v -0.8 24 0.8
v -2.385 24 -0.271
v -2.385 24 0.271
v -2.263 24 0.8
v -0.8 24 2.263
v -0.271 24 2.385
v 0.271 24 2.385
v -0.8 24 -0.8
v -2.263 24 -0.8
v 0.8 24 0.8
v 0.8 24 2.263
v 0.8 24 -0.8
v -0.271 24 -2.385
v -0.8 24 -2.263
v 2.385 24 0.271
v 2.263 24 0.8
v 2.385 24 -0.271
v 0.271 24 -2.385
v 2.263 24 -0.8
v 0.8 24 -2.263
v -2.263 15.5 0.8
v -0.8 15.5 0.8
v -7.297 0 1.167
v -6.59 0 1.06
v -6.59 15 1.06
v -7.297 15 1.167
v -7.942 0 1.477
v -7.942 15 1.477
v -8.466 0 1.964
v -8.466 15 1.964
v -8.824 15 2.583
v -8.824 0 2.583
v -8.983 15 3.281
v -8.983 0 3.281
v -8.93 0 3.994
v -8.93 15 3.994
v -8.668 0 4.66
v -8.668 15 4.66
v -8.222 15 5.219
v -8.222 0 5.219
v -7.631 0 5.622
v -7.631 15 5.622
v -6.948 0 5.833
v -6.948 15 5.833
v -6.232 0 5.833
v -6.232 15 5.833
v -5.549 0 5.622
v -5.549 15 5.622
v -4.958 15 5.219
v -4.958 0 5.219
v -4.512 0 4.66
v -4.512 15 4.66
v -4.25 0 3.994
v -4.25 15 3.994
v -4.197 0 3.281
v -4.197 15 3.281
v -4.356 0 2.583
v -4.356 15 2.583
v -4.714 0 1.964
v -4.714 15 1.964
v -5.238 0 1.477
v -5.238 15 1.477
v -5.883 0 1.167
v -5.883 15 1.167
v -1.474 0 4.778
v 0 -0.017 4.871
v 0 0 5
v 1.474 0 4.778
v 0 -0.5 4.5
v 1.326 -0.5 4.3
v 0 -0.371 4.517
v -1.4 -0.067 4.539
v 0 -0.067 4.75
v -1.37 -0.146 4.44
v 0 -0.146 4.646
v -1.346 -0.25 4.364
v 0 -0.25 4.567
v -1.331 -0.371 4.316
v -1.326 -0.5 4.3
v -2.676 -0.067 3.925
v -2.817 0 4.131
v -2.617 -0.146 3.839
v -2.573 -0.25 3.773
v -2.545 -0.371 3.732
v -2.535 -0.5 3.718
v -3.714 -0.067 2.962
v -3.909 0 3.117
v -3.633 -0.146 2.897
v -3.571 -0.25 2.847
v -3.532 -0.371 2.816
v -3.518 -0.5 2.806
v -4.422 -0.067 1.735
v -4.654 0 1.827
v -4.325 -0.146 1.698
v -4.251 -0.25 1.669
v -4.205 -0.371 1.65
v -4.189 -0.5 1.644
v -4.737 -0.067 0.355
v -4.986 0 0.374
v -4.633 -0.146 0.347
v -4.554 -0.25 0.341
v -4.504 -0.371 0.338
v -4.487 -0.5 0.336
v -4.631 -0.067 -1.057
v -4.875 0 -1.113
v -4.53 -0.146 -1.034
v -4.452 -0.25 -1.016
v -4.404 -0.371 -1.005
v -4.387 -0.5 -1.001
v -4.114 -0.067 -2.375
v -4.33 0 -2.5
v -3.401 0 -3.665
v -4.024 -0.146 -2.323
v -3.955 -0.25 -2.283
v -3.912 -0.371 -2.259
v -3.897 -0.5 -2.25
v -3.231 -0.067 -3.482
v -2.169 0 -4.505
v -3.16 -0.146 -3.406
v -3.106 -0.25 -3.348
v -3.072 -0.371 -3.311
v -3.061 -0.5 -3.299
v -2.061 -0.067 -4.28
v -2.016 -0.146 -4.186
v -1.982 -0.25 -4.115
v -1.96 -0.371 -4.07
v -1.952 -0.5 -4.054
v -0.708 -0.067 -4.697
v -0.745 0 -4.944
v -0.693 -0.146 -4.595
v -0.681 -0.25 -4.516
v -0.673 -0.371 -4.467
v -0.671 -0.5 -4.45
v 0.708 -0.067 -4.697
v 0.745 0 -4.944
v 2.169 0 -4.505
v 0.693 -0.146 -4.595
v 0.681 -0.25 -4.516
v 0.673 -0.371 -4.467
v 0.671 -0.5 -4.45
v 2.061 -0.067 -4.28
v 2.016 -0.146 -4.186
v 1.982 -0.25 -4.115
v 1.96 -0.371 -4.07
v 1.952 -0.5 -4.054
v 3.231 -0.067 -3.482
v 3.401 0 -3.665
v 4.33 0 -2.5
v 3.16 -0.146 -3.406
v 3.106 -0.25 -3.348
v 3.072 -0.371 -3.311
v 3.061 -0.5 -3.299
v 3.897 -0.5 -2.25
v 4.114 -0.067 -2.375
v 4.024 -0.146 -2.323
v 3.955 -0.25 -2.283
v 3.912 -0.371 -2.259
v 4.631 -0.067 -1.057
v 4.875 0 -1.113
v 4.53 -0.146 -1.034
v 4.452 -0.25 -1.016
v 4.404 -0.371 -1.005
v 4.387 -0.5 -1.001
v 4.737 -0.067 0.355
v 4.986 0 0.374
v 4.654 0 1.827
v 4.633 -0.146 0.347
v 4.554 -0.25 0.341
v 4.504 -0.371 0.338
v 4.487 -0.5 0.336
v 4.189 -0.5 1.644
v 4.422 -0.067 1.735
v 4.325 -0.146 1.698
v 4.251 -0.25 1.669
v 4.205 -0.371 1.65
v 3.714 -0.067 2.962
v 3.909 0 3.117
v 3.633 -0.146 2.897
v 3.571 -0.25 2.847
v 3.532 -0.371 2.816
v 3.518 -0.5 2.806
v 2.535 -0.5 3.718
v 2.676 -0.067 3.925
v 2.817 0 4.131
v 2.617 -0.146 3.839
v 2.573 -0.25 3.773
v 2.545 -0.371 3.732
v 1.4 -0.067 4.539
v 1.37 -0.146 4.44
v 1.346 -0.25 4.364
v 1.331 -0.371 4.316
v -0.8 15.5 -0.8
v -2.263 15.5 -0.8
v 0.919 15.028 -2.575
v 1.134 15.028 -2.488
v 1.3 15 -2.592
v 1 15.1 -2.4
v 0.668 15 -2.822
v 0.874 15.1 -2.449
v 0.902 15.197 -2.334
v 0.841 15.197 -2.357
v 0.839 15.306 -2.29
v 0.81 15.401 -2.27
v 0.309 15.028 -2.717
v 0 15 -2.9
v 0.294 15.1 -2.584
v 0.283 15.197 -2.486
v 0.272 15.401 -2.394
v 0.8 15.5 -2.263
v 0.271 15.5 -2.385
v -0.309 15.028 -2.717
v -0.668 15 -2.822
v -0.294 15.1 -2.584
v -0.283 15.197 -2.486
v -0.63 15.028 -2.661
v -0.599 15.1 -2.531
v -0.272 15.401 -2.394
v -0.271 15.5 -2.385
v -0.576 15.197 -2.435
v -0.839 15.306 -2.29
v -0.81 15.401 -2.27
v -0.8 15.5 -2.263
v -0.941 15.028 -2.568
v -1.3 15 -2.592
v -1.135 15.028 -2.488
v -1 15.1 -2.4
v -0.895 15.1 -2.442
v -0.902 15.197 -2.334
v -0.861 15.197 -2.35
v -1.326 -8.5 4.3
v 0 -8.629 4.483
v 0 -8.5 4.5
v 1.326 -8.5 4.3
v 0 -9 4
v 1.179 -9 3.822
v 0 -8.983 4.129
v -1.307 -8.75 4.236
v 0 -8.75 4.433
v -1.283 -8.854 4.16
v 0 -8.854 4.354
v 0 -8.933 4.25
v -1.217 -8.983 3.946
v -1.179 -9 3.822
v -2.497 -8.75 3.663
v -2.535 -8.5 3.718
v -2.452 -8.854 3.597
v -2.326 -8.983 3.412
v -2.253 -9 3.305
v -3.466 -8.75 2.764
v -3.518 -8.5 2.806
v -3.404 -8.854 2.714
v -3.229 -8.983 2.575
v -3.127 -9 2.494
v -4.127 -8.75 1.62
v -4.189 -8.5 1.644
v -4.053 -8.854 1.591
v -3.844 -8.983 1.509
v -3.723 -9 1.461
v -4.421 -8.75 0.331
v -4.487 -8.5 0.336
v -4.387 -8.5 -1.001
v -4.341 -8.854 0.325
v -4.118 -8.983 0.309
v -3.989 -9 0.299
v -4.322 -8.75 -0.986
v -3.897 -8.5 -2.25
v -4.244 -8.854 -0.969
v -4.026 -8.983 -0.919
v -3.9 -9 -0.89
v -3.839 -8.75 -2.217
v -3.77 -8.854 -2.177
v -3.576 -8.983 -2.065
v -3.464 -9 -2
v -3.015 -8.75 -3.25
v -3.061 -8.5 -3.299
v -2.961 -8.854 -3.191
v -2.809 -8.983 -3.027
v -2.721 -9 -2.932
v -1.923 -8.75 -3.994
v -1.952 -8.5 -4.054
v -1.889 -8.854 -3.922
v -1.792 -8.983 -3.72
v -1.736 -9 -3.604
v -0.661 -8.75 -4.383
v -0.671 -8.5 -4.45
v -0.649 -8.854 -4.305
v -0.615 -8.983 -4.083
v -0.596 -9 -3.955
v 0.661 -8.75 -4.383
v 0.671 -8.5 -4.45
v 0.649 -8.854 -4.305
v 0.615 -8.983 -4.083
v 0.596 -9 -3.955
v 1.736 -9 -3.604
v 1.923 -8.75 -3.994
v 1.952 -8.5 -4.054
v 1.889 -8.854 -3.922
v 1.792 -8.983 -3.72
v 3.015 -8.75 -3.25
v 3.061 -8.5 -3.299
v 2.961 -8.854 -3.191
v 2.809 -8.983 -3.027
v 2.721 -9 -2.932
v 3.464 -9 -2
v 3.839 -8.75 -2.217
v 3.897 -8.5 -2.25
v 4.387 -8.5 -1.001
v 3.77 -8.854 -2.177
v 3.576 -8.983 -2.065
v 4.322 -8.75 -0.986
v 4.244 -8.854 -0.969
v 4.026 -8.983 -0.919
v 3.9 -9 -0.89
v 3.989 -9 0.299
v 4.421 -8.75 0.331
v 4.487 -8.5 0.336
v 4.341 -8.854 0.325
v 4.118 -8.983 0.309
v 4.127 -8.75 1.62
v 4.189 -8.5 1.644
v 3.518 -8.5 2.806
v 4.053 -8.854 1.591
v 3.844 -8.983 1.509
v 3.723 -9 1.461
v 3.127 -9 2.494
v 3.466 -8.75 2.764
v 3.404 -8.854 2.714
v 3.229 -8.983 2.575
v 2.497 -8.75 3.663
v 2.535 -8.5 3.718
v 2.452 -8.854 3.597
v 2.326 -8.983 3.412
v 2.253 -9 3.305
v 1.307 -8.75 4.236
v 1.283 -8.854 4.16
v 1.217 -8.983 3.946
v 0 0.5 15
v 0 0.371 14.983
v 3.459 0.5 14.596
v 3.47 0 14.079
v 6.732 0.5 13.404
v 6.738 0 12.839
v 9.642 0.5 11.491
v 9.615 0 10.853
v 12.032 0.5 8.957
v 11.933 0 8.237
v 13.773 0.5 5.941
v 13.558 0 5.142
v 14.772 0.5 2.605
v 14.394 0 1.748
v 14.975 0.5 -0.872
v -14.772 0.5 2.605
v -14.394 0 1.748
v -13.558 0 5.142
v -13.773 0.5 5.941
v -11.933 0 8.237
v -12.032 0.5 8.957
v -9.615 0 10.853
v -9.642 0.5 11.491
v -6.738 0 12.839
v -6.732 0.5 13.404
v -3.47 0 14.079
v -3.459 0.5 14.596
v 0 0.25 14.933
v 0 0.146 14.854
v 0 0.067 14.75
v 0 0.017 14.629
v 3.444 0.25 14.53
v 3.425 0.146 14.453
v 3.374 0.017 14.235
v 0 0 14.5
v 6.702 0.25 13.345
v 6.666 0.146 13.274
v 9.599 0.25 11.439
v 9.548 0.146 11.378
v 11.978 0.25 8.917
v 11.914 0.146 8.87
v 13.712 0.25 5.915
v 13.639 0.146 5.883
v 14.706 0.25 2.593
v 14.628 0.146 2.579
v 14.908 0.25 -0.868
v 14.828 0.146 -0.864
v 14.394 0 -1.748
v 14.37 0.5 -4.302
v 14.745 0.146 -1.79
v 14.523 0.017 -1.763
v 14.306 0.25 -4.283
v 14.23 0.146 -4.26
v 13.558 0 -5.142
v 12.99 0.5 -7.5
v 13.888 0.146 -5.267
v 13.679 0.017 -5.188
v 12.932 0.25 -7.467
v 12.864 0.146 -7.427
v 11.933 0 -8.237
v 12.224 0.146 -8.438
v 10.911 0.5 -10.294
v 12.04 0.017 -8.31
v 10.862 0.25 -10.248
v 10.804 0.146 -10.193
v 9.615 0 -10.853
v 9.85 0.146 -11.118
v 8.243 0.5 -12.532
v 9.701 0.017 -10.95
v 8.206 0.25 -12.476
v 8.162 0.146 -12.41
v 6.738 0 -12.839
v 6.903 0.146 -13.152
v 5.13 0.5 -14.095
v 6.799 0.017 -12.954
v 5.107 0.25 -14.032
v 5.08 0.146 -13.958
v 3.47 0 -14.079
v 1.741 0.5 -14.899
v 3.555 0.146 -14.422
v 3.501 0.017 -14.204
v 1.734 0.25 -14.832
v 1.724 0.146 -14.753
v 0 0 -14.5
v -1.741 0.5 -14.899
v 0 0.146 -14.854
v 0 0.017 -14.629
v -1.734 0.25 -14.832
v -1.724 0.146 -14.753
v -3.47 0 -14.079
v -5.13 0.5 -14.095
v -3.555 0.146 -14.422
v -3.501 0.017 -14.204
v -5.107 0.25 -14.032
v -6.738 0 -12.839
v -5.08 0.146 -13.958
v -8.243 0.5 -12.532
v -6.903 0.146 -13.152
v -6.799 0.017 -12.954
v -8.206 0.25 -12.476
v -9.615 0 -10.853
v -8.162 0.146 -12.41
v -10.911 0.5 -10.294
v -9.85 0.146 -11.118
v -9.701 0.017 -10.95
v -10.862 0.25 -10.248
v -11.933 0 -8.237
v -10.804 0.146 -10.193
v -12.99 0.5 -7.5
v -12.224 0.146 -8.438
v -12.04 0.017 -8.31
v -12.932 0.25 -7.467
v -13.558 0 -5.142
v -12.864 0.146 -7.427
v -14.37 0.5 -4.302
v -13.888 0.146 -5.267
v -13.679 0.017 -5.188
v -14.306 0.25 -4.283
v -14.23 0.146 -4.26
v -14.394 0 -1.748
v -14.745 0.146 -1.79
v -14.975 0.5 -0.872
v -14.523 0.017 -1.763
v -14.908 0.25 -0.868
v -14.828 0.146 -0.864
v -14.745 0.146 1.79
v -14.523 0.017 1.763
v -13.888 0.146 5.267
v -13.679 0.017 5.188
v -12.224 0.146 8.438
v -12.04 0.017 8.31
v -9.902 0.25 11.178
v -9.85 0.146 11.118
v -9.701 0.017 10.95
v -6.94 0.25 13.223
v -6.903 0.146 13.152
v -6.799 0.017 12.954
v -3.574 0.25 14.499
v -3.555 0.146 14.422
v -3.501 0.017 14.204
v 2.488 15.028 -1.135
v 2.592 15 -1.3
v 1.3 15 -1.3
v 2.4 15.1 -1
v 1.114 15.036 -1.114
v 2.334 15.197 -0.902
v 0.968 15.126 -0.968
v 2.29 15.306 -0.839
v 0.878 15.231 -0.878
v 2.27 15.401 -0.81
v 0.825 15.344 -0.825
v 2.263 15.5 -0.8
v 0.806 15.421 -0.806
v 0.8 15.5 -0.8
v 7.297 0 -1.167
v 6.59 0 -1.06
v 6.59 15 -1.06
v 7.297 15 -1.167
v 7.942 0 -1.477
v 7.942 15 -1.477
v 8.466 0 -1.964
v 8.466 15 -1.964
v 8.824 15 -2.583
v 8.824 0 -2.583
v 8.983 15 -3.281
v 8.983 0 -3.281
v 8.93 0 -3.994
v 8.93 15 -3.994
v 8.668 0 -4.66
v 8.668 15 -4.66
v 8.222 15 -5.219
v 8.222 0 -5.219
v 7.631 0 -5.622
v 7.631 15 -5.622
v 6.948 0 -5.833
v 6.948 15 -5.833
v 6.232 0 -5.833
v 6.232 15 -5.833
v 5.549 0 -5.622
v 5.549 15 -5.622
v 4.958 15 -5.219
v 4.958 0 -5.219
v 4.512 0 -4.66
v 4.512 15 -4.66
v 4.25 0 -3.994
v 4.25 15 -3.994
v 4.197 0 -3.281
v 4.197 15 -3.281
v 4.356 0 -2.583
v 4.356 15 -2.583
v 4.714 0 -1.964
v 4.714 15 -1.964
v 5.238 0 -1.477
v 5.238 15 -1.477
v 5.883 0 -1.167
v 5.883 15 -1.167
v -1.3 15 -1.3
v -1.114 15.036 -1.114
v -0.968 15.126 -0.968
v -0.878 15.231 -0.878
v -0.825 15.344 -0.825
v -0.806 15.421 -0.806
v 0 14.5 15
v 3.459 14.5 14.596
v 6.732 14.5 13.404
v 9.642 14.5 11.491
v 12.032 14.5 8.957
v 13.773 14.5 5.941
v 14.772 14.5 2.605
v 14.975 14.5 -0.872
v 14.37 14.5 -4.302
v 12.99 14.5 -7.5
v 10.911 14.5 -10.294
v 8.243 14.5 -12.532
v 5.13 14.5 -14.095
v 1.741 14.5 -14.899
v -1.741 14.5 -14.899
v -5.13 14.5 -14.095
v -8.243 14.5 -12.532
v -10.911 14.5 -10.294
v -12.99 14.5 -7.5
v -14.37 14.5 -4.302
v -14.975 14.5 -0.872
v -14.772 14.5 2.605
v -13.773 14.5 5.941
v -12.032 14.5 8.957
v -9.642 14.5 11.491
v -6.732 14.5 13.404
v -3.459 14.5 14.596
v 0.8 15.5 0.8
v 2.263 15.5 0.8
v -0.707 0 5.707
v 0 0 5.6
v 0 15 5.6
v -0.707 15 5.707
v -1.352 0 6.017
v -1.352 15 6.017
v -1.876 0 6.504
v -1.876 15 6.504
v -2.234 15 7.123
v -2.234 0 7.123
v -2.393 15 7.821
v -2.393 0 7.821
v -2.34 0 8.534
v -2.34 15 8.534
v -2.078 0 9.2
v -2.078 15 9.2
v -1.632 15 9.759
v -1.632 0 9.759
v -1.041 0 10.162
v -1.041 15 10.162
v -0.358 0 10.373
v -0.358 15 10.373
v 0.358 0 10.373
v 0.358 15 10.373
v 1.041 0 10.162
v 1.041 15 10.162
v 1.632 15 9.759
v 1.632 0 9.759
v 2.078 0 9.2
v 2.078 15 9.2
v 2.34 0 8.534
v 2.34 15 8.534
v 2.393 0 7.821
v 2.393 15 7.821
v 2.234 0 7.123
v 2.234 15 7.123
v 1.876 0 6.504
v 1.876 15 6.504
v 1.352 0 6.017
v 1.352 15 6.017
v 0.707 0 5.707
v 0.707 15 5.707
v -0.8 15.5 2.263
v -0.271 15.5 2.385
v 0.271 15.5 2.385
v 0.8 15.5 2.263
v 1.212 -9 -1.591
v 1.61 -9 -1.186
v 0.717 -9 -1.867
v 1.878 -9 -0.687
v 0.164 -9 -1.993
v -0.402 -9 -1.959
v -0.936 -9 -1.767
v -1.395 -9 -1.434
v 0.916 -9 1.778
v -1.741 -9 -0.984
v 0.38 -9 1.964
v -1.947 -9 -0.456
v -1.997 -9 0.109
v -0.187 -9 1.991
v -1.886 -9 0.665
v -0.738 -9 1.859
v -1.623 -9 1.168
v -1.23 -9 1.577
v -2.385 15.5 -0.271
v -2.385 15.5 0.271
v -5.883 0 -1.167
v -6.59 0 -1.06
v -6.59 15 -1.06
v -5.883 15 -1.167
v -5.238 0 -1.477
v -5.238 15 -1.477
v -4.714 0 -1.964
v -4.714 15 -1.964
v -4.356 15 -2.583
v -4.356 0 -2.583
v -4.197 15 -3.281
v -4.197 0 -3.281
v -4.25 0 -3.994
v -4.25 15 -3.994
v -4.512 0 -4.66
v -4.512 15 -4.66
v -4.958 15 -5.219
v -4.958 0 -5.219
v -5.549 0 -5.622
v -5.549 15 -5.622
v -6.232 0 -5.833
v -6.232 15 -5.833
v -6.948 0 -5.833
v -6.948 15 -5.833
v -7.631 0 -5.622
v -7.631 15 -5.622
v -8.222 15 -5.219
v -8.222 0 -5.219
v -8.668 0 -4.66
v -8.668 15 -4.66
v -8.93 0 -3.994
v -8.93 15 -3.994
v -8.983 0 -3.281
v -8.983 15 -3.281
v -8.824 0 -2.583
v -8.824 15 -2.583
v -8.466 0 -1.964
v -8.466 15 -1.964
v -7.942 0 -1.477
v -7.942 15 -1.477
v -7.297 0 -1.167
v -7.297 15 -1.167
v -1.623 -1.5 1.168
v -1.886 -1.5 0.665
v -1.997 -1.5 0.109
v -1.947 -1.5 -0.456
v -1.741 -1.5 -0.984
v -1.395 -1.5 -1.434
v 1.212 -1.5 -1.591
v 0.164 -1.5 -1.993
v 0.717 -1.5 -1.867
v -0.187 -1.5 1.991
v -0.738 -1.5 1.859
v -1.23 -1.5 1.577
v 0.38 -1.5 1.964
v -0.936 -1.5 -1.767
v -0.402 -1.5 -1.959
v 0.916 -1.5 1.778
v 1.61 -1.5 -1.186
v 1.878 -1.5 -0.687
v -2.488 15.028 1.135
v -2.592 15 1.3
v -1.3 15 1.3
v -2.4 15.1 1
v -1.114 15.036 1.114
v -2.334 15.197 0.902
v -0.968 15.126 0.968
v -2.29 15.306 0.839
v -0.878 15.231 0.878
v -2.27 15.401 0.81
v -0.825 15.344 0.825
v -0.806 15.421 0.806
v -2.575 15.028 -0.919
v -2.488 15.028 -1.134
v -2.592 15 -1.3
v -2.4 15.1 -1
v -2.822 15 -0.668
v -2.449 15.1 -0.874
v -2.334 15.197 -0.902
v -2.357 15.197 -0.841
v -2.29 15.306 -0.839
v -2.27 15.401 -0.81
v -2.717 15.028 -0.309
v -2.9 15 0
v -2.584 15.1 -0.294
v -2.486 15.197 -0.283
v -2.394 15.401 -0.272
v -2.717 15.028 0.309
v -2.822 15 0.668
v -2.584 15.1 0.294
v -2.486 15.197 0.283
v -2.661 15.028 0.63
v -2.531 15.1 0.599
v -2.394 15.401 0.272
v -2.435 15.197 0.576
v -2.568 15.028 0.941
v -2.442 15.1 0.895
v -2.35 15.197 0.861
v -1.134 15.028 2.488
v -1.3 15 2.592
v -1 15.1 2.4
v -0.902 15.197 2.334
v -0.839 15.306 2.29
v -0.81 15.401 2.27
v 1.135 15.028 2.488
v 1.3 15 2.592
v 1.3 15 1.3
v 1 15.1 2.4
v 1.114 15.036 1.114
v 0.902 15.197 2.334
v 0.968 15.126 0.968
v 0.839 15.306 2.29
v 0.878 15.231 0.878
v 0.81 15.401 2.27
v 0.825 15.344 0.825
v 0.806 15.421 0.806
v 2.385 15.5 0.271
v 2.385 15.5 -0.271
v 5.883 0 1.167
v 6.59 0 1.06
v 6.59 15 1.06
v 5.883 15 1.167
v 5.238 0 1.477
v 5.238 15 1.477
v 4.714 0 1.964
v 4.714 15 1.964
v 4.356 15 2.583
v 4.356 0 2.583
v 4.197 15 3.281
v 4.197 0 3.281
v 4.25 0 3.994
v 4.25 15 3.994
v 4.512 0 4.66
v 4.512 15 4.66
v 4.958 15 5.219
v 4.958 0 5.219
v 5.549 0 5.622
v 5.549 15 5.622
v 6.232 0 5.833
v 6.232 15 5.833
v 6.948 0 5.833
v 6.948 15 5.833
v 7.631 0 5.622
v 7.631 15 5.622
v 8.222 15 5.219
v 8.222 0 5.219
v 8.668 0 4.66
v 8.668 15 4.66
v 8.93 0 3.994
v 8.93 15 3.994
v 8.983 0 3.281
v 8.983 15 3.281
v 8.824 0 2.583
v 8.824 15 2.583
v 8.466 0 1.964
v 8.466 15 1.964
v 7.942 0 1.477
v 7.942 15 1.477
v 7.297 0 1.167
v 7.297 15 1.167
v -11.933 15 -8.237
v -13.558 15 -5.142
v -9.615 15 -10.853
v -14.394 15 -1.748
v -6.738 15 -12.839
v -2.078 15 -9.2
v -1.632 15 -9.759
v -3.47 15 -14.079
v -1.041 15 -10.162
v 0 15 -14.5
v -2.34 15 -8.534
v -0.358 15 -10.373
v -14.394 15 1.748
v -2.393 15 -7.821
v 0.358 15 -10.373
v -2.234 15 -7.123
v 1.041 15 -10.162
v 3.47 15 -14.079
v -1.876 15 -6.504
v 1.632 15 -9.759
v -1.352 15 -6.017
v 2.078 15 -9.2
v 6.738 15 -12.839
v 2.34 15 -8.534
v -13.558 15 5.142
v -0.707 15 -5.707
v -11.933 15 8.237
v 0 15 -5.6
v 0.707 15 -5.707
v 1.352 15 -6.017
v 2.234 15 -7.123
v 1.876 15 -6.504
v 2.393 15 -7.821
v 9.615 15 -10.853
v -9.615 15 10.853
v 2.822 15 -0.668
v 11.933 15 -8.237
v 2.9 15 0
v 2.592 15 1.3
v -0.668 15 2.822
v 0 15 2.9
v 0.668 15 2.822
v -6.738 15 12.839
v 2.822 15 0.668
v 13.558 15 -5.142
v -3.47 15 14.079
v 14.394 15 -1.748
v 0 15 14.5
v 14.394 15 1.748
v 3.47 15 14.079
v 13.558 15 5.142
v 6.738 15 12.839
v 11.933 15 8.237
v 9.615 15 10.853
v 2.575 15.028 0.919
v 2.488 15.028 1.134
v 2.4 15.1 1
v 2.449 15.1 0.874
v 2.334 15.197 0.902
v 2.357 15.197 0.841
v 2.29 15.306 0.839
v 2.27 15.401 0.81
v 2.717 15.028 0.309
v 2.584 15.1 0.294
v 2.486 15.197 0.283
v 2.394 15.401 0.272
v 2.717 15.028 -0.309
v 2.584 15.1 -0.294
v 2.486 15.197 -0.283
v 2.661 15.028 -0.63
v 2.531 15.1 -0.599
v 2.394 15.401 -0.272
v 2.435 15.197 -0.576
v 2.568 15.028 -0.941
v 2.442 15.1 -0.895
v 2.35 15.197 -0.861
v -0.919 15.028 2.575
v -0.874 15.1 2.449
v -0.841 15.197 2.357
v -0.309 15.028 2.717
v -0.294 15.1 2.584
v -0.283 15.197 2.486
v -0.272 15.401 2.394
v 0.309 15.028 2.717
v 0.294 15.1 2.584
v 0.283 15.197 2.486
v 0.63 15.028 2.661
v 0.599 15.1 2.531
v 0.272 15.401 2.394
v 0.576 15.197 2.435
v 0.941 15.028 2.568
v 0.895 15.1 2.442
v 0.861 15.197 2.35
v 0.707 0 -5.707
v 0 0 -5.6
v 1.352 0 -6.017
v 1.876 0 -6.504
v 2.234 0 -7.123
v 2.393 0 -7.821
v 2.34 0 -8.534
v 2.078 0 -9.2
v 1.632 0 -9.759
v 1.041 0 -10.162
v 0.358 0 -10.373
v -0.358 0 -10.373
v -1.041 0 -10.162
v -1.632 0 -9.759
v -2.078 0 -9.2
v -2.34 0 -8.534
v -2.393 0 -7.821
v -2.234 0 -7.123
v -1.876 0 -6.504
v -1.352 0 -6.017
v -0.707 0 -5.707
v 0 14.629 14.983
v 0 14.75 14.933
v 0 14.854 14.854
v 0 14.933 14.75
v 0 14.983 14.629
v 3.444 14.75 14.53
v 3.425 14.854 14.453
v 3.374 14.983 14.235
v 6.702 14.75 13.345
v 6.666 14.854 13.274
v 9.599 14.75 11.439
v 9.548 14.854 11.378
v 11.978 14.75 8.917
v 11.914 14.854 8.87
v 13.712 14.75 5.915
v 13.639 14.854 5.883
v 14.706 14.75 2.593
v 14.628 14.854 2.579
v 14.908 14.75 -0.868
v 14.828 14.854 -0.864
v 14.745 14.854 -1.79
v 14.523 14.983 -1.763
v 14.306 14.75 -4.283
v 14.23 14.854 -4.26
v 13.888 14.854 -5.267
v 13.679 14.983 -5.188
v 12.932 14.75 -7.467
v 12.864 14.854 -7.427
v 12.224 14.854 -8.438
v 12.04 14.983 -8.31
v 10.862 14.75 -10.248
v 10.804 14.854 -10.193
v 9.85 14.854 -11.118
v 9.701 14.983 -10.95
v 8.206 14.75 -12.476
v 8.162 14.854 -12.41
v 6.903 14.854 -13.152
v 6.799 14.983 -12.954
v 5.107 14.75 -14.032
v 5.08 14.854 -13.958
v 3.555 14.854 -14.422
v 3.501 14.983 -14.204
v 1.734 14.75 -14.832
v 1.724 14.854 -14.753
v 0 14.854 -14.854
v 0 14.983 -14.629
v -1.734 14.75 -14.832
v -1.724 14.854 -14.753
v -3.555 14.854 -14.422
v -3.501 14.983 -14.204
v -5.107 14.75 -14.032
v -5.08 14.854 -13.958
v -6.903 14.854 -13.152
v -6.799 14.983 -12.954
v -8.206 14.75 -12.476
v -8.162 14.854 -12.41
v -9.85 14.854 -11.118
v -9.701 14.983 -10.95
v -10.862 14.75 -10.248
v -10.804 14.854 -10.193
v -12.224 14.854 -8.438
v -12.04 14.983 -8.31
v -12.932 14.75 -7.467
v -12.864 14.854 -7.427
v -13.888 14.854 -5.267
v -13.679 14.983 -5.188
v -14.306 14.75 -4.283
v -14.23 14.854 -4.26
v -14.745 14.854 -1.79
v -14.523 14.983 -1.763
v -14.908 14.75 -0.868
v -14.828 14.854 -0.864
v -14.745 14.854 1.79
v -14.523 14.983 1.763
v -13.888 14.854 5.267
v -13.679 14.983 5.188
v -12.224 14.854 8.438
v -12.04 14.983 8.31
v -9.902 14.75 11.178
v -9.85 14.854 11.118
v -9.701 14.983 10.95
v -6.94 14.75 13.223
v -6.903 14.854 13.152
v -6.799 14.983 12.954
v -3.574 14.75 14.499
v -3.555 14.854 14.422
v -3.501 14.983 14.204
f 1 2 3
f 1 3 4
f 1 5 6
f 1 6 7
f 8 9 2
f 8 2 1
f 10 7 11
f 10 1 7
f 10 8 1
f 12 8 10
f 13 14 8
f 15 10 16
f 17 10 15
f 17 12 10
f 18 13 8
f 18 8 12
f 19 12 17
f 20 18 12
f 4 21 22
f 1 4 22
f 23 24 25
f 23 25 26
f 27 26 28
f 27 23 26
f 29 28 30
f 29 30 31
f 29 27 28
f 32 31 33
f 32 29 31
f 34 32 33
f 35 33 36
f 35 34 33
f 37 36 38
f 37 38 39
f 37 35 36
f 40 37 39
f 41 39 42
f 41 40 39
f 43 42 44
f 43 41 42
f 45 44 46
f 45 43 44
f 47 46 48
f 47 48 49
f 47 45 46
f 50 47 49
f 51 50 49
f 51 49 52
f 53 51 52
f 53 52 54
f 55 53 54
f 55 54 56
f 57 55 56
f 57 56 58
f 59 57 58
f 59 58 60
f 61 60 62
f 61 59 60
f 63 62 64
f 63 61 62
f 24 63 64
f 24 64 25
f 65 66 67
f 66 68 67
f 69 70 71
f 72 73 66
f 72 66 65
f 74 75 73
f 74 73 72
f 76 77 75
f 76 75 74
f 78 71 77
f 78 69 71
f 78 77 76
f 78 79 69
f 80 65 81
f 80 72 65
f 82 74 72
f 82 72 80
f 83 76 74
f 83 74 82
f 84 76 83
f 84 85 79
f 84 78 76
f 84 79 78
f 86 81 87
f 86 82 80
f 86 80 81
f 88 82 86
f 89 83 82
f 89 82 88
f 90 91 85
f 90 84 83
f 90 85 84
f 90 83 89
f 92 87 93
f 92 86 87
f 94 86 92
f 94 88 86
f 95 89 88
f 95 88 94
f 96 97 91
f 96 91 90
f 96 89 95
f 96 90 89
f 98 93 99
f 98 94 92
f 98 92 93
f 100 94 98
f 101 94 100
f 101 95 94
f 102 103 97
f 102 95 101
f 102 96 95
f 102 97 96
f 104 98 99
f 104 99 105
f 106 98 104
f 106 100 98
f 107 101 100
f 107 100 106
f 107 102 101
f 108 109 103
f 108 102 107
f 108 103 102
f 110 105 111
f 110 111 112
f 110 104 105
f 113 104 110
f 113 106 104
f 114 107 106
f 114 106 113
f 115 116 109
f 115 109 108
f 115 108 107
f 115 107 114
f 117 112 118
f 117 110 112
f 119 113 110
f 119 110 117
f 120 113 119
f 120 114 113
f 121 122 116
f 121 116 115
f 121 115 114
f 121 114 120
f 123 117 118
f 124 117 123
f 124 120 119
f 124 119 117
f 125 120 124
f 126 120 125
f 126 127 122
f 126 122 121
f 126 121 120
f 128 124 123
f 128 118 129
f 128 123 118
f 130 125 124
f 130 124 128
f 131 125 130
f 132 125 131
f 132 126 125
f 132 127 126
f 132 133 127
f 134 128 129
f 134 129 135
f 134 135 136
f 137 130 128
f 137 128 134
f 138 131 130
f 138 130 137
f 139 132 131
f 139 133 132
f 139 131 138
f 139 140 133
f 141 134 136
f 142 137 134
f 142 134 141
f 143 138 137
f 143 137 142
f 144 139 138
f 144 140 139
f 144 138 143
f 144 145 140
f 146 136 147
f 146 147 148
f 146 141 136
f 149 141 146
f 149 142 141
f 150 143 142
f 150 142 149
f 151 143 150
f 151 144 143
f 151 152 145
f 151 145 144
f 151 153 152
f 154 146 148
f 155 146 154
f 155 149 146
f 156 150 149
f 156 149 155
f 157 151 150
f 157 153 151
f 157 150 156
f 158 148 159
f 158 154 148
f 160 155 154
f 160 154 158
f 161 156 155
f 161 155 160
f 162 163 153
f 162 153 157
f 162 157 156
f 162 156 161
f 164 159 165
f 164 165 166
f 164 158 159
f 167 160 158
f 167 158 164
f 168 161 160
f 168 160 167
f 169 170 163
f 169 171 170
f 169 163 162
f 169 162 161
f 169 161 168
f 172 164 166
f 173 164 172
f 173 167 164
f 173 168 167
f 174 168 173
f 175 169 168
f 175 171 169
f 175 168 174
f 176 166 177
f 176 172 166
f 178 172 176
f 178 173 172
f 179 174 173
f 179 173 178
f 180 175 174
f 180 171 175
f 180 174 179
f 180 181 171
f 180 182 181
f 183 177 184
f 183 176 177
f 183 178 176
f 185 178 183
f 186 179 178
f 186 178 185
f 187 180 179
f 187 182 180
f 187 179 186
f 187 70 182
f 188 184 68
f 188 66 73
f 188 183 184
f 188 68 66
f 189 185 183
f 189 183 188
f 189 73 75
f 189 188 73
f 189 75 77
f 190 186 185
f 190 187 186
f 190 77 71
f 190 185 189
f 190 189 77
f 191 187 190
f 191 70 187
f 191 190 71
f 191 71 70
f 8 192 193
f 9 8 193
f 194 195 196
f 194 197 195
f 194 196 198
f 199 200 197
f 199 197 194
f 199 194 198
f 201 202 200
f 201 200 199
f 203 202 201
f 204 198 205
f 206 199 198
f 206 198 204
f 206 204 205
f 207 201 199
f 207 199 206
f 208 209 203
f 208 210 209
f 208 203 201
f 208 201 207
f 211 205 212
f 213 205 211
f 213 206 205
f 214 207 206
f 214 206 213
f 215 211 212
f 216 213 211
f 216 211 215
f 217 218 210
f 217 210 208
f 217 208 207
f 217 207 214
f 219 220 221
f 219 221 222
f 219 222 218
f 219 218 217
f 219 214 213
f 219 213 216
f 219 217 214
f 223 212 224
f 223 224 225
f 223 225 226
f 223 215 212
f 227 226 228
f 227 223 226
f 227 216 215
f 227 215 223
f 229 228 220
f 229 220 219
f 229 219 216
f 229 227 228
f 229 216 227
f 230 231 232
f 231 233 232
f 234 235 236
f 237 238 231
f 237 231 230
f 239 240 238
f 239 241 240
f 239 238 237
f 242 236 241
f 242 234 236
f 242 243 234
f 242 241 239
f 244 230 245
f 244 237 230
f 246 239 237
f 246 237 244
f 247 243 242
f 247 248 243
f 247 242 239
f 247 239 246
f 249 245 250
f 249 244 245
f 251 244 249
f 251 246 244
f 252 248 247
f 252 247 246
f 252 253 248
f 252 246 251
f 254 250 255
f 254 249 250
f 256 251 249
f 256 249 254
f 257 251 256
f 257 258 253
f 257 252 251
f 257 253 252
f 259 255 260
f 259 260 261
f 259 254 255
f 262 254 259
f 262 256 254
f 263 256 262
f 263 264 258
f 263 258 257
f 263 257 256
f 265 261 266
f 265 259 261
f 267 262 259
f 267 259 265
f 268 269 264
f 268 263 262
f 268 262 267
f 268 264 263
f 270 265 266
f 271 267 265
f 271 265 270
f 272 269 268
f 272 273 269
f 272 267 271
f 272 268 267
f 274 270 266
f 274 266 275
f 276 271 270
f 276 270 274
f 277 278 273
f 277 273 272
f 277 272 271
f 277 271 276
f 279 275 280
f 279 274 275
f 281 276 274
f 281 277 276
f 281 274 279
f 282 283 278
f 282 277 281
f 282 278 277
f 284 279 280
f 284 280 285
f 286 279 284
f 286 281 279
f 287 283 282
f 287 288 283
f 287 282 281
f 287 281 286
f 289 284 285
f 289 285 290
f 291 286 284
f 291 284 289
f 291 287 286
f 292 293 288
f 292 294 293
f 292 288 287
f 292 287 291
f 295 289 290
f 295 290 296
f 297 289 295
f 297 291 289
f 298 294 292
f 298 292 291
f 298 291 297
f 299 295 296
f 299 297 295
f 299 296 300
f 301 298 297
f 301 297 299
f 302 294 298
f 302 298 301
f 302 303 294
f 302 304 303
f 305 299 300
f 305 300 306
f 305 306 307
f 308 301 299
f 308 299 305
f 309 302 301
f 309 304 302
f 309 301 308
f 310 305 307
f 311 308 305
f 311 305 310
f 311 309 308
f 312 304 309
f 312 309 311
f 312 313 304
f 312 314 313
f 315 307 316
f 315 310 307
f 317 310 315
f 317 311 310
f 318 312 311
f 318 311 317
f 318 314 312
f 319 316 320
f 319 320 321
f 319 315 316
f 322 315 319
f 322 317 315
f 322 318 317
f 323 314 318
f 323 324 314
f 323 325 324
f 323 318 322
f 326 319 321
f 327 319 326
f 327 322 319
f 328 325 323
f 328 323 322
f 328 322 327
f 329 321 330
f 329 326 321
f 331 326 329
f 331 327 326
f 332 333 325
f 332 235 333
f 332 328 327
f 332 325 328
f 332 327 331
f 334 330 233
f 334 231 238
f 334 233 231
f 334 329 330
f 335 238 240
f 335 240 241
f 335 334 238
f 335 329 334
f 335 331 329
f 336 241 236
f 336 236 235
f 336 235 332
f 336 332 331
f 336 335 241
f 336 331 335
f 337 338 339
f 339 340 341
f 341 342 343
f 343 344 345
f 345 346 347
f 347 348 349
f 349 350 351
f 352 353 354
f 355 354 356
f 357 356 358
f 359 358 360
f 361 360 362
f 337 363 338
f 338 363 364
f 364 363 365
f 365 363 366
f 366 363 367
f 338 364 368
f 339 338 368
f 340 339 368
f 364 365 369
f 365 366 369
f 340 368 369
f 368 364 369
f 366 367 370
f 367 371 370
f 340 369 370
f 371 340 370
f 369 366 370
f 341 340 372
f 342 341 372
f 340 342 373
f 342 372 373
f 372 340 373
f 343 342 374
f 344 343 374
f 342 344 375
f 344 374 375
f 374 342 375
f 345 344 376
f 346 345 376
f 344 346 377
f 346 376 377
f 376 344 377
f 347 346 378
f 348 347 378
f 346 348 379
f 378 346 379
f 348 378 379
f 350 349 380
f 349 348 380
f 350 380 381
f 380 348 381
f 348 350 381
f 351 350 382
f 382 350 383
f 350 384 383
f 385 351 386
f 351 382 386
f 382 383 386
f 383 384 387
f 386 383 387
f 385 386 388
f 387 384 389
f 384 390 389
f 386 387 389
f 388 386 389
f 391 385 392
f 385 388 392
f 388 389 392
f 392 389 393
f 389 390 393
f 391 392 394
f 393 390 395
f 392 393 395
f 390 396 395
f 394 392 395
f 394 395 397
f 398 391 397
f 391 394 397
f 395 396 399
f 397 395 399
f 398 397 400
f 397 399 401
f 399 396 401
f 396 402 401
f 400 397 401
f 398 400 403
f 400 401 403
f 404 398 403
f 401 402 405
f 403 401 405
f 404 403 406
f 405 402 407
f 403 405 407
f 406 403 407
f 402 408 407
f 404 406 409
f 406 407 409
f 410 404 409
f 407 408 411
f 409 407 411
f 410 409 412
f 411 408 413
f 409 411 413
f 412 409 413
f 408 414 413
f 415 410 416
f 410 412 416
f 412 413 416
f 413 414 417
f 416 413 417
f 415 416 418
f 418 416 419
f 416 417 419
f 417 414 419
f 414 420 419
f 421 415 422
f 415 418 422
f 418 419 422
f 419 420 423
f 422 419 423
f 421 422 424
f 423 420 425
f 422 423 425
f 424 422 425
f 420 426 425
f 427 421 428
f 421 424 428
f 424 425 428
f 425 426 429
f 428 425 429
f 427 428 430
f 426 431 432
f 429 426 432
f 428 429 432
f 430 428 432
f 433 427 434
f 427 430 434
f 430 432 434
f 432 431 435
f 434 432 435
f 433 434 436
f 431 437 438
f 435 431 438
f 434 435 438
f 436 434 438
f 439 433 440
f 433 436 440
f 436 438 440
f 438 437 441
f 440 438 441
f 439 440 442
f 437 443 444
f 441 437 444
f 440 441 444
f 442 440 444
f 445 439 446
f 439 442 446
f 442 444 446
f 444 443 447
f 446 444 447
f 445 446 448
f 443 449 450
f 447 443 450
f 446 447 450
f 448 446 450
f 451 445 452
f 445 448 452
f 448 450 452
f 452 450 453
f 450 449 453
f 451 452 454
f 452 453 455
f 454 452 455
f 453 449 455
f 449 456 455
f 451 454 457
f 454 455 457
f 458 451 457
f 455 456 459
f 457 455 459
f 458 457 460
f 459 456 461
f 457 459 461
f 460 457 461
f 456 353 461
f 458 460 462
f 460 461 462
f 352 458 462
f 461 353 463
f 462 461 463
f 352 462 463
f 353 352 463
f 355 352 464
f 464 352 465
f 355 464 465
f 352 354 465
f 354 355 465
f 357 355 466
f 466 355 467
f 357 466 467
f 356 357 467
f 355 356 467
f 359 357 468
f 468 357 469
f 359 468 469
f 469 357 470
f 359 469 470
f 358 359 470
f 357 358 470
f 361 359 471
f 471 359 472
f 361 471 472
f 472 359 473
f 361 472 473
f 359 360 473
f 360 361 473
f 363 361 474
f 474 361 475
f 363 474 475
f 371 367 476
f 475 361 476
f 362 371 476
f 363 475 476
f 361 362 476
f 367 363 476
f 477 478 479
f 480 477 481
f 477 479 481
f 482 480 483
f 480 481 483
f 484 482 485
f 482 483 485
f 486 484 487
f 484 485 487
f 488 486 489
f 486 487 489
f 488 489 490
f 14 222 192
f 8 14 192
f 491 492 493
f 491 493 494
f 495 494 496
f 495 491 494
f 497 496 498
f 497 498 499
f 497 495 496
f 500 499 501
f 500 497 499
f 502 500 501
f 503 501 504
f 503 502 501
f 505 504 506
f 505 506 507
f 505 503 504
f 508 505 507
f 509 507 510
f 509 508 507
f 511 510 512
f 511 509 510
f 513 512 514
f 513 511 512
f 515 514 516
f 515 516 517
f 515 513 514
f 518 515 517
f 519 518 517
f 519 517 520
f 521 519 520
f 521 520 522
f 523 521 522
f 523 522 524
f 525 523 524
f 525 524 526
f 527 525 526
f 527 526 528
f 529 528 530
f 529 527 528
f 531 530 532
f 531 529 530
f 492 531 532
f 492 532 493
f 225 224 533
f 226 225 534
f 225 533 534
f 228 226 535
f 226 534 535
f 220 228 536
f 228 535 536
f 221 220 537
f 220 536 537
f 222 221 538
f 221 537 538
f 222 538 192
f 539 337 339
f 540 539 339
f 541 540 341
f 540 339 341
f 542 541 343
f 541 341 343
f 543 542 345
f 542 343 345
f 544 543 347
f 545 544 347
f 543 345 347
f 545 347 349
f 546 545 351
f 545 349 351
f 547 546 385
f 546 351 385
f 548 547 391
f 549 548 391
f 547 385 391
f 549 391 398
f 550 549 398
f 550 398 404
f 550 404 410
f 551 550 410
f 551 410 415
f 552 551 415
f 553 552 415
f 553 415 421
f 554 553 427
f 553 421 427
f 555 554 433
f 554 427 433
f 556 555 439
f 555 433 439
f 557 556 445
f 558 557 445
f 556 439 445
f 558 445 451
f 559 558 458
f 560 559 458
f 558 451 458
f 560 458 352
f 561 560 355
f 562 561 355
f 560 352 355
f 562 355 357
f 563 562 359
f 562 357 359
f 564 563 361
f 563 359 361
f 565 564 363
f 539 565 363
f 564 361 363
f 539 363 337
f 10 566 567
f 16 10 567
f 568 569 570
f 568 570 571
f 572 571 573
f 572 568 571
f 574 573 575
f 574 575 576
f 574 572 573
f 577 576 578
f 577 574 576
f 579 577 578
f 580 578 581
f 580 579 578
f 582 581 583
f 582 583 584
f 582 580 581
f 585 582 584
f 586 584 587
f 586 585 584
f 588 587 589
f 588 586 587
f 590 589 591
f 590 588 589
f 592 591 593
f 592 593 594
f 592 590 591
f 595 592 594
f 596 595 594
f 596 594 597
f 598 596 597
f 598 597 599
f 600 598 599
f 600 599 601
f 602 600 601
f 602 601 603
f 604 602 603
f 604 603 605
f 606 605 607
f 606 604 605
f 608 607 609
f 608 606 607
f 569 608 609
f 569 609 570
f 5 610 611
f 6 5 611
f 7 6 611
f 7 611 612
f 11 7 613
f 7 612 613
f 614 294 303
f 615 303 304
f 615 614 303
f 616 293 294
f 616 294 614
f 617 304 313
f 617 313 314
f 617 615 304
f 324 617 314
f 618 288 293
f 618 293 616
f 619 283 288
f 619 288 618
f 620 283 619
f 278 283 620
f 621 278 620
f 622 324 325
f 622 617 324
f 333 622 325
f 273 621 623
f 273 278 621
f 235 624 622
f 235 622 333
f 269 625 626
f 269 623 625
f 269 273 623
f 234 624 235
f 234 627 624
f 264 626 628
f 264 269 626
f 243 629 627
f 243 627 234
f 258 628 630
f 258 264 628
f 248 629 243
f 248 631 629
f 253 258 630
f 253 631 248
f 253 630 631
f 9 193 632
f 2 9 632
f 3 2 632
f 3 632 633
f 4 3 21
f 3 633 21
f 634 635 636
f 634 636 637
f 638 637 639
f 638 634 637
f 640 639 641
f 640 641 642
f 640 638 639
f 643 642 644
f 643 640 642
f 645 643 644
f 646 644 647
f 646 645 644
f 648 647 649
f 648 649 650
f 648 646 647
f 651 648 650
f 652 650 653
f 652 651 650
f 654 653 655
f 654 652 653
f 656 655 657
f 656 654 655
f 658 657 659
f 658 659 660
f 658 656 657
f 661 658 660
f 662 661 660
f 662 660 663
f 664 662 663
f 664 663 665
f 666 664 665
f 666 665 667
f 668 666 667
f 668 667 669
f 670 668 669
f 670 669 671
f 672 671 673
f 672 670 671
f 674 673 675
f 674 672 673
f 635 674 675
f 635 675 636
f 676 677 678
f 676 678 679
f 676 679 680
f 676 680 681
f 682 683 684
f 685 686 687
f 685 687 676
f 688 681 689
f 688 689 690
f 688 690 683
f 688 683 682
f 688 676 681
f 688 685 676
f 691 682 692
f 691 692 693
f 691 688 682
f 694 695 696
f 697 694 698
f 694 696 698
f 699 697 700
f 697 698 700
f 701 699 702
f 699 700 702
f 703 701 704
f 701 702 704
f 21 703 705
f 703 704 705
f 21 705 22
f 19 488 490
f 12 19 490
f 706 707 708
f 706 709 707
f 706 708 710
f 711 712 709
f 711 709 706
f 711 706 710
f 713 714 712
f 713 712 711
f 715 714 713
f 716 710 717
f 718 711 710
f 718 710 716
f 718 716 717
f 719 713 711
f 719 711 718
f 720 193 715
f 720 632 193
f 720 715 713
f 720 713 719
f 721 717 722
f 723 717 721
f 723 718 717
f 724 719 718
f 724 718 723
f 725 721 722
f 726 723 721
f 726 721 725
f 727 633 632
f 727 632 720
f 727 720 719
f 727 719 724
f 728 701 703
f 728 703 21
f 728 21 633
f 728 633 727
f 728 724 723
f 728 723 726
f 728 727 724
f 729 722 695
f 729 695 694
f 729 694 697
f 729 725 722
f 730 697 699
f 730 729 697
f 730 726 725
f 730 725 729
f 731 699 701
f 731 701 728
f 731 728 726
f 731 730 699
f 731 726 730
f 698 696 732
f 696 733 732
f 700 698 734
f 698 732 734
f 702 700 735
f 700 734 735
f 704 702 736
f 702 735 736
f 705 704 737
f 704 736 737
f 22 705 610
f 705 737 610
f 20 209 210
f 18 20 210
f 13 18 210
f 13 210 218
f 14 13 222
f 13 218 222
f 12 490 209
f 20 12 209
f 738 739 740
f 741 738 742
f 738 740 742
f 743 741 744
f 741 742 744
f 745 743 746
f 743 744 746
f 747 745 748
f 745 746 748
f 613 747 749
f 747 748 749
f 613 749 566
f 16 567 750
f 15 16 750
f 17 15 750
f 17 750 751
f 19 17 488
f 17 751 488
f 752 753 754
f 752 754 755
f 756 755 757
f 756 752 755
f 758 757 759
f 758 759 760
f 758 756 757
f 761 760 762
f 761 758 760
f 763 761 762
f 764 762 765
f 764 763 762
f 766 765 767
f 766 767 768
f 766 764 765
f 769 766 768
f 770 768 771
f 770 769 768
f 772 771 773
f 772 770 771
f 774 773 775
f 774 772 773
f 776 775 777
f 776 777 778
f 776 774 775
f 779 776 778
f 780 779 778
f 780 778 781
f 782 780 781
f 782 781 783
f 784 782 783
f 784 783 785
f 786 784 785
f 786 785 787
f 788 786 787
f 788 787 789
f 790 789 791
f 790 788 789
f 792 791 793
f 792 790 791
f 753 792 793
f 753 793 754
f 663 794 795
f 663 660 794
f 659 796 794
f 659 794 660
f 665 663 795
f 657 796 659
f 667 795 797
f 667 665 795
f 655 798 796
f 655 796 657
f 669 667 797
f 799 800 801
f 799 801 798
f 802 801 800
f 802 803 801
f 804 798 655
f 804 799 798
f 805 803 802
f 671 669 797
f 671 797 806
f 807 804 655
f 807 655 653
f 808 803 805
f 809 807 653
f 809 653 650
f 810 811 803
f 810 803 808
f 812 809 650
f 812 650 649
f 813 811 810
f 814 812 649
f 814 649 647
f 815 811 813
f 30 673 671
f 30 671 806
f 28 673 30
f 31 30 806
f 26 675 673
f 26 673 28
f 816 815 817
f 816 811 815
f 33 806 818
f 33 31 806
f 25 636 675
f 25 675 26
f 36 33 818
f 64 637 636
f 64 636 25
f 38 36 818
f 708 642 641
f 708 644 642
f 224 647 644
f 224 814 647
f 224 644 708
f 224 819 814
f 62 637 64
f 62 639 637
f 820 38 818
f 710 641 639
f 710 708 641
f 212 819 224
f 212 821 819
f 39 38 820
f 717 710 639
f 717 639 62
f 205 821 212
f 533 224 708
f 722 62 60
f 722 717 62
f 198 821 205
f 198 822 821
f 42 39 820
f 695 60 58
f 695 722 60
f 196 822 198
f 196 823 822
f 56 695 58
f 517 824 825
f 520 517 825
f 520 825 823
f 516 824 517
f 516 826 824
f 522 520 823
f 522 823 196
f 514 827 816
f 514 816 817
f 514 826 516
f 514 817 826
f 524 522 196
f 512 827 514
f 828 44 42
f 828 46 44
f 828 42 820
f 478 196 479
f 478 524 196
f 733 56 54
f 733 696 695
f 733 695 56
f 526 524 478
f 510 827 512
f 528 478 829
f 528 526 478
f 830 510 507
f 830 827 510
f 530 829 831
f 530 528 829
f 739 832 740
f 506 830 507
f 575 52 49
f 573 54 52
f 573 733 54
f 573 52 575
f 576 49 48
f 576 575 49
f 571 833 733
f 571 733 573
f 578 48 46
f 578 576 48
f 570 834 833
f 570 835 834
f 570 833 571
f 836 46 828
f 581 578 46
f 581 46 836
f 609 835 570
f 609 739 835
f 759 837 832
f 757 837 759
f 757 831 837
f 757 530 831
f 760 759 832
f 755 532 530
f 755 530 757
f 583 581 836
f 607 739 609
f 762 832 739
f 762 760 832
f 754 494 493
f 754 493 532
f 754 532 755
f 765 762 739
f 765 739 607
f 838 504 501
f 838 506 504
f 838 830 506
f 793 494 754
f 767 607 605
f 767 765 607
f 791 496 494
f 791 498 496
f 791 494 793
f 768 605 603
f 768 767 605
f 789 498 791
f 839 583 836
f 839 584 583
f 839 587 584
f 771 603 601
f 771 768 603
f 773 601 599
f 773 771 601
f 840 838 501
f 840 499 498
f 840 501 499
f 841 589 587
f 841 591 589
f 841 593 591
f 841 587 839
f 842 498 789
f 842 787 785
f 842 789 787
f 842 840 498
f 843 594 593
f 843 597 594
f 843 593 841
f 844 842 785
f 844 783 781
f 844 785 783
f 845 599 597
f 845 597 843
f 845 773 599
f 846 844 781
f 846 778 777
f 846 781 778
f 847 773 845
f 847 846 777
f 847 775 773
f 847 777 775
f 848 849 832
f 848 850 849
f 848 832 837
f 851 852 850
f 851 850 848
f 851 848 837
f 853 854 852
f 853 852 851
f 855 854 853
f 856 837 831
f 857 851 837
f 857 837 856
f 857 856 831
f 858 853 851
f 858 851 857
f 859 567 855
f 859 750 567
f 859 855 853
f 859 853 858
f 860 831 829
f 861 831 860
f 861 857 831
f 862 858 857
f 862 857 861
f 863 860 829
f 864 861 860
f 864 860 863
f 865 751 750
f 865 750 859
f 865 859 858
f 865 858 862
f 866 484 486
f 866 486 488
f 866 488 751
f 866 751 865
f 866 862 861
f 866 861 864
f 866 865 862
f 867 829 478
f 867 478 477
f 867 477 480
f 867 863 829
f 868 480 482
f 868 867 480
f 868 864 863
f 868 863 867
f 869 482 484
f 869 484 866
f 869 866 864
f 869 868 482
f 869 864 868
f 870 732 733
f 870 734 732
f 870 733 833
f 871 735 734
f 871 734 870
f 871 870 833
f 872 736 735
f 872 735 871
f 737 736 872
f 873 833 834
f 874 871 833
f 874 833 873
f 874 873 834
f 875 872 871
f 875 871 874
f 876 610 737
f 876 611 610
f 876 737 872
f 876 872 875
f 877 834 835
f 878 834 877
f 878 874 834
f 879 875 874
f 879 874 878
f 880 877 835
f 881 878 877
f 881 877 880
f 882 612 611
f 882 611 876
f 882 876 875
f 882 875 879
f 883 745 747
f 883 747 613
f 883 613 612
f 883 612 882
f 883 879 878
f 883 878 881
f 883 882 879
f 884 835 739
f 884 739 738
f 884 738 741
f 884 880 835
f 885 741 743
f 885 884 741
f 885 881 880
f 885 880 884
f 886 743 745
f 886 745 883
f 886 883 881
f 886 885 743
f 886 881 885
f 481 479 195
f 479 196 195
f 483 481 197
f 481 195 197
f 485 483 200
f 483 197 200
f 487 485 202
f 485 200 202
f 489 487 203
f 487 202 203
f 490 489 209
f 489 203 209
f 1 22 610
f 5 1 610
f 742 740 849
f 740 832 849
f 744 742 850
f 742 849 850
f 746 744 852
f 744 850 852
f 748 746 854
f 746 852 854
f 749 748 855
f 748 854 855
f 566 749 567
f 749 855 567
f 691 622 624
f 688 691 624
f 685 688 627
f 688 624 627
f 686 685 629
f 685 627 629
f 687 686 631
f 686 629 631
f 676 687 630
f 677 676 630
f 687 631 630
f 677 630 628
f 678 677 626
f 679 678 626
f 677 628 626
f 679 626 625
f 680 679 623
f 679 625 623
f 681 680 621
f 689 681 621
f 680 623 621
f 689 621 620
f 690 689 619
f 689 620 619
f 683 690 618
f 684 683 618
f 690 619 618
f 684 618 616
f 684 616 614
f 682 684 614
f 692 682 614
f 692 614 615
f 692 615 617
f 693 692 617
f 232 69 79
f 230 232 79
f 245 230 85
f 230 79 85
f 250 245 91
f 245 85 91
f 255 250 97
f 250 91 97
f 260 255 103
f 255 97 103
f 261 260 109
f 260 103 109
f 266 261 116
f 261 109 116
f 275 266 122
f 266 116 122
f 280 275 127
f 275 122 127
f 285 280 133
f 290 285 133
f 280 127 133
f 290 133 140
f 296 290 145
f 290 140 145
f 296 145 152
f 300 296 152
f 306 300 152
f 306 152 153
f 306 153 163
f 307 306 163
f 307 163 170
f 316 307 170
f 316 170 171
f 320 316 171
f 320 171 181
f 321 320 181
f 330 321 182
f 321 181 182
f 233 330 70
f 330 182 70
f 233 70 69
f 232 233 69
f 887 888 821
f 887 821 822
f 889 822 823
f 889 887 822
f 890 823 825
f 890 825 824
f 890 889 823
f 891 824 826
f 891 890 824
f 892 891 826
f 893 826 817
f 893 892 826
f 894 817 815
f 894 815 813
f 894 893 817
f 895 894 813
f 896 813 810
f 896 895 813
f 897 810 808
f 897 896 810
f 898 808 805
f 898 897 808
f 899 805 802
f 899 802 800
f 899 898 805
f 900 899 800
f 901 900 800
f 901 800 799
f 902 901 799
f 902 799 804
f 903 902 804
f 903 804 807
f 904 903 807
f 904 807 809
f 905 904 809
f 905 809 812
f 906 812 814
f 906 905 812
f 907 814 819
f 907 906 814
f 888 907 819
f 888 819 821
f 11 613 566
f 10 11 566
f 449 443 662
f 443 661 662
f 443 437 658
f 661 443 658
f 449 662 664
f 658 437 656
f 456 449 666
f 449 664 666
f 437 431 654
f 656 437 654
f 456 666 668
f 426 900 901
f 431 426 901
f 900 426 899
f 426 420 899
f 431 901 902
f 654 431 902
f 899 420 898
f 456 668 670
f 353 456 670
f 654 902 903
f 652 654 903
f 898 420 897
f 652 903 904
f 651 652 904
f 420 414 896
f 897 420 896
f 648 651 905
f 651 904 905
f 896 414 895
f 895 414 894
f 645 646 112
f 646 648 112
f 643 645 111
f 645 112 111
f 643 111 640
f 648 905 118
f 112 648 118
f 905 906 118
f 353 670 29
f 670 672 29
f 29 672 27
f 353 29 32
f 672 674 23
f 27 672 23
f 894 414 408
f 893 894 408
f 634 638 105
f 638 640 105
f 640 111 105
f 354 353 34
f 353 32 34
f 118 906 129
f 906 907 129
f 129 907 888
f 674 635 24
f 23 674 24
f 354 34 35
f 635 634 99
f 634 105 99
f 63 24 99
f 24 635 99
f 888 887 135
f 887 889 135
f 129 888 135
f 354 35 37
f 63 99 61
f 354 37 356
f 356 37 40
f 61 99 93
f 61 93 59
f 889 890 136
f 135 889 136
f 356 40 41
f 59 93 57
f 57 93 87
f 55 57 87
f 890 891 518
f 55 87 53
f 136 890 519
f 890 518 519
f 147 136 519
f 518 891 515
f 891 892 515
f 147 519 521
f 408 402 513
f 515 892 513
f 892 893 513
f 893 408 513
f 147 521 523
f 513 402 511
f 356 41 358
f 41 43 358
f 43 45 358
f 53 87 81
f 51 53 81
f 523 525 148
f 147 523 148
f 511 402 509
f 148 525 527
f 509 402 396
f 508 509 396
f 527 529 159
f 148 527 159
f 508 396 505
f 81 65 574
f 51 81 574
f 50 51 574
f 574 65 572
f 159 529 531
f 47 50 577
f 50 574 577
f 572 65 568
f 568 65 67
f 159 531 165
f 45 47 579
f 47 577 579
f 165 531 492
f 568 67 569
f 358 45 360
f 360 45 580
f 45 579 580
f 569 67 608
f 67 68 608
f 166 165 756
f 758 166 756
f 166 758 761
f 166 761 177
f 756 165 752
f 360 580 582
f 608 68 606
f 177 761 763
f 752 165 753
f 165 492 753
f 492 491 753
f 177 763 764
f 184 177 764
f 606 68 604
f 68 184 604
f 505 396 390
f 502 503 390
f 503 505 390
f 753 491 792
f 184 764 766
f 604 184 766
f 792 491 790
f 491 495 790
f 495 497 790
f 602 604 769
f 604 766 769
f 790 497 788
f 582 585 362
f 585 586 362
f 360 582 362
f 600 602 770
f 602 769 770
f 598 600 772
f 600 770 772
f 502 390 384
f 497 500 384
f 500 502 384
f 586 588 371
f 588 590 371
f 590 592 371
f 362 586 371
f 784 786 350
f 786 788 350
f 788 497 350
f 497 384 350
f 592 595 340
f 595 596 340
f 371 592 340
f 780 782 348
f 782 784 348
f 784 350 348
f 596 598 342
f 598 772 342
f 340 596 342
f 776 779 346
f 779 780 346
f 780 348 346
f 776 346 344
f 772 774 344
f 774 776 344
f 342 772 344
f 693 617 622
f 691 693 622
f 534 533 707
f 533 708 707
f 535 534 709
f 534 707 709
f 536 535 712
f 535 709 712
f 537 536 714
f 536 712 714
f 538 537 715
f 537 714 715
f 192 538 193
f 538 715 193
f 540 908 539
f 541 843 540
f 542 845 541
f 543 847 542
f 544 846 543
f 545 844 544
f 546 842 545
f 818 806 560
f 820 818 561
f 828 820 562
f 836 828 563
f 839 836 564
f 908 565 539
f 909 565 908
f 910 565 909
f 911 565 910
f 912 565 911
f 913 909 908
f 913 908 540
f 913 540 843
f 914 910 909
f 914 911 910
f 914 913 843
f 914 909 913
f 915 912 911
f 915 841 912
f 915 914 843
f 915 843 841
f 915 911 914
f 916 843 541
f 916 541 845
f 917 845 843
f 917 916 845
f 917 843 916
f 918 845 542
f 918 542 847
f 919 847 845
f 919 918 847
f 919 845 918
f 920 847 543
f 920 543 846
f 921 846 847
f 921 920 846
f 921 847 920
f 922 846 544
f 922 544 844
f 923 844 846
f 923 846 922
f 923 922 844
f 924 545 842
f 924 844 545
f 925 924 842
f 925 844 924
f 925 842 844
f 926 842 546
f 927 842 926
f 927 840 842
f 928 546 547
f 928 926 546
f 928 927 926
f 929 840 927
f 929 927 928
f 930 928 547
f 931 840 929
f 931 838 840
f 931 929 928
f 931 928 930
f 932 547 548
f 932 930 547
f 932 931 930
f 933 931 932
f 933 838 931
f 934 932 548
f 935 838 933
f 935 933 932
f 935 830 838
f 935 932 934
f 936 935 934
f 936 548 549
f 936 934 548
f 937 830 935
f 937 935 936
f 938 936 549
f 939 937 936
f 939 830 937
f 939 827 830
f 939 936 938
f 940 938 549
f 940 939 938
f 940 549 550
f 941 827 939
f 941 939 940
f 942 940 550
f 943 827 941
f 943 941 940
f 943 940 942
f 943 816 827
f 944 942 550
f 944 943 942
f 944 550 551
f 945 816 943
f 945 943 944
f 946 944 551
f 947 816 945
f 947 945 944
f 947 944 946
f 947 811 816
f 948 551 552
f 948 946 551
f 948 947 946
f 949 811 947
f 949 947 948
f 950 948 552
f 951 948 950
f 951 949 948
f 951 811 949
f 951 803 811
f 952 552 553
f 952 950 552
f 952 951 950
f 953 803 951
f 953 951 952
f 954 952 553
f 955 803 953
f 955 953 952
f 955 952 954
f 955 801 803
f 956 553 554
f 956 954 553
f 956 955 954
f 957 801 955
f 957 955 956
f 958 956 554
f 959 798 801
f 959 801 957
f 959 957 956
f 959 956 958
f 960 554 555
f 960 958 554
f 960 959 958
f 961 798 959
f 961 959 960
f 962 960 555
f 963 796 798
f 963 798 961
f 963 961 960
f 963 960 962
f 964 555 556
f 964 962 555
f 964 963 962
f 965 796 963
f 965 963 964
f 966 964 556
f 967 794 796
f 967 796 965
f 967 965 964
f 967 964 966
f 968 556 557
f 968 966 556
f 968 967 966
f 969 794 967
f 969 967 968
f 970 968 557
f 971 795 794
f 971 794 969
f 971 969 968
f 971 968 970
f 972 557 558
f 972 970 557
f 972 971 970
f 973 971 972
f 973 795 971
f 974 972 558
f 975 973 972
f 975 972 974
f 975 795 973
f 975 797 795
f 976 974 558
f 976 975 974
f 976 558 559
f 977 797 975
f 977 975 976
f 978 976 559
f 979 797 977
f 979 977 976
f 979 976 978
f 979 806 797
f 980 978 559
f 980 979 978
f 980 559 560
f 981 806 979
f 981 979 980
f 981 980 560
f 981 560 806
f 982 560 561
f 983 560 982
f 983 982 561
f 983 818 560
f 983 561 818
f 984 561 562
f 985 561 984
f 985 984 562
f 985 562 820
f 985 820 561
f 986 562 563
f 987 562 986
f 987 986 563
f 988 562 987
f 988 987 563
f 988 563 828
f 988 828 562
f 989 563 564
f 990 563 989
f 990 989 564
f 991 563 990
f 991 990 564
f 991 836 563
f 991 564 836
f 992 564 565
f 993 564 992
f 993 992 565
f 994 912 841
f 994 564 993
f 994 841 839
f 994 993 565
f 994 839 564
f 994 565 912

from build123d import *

# Parameters (mm, degrees)
ESBO_O2_R                = 15
RESSALTO_EXTRUS_O3_DEPTH = 15
ESBO_O1_R                = 2.4
CORTE_EXTRUS_O4_DEPTH    = 15
RESSALTO_EXTRUS_O4_DEPTH = 9
ESBO_O5_R                = 4.5
RESSALTO_EXTRUS_O5_DEPTH = 9
CORTE_EXTRUS_O7_DEPTH    = 7.5
FILETE3_R                = 0.5


with BuildPart() as part:
    # Esboço2 → Ressalto-extrusão3 (new body)
    with BuildSketch(Plane(origin=(0, 0, 0), x_dir=(1, 0, 0), z_dir=(0, 1, 0))):
        with Locations(Location((0, 0, 0), (0, 0, 270))):
            Circle(ESBO_O2_R)
    extrude(amount=RESSALTO_EXTRUS_O3_DEPTH)

    # Esboço1 → Corte-extrusão4 (cut)
    with BuildSketch(Plane(origin=(0, 0, 0), x_dir=(1, 0, 0), z_dir=(0, 1, 0))):
        with Locations(Location((-6.59, 3.46, 0), (0, 0, 270))):
            Circle(ESBO_O1_R)
        with Locations(Location((6.59, 3.46, 0), (0, 0, 270))):
            Circle(ESBO_O1_R)
        with Locations(Location((6.59, -3.46, 0), (0, 0, 90))):
            Circle(ESBO_O1_R)
        with Locations(Location((0, 8, 0), (0, 0, 270))):
            Circle(ESBO_O1_R)
        with Locations(Location((0, -8, 0), (0, 0, 90))):
            Circle(ESBO_O1_R)
        with Locations(Location((-6.59, -3.46, 0), (0, 0, 90))):
            Circle(ESBO_O1_R)
    extrude(amount=CORTE_EXTRUS_O4_DEPTH, mode=Mode.SUBTRACT)

    # Esboço3 → Ressalto-extrusão4 (add)
    with BuildSketch(Plane(origin=(0, 15, 0), x_dir=(1, 0, 0), z_dir=(0, 1, 0))):
        with BuildLine():
            Line((0.8, -0.8), (2.2627417, -0.8))
            ThreePointArc((2.2627417, -0.8), (2.4, 0), (2.2627417, 0.8))
            Line((2.2627417, 0.8), (0.8, 0.8))
            Line((0.8, 0.8), (0.8, 2.2627417))
            ThreePointArc((0.8, 2.2627417), (0, 2.4), (-0.8, 2.2627417))
            Line((-0.8, 2.2627417), (-0.8, 0.8))
            Line((-0.8, 0.8), (-2.2627417, 0.8))
            ThreePointArc((-2.2627417, 0.8), (-2.4, 0), (-2.2627417, -0.8))
            Line((-2.2627417, -0.8), (-0.8, -0.8))
            Line((-0.8, -0.8), (-0.8, -2.2627417))
            ThreePointArc((-0.8, -2.2627417), (0, -2.4), (0.8, -2.2627417))
            Line((0.8, -2.2627417), (0.8, -0.8))
        make_face()
    extrude(amount=RESSALTO_EXTRUS_O4_DEPTH)

    # Esboço5 → Ressalto-extrusão5 (add)
    with BuildSketch(Plane.XZ):
        with Locations(Location((0, 0, 0), (0, 0, 90))):
            Circle(ESBO_O5_R)
    extrude(amount=RESSALTO_EXTRUS_O5_DEPTH)

    # Esboço6 → Corte-extrusão7 (cut)
    with BuildSketch(Plane.XZ.offset(9)):
        with BuildLine():
            Line((1.878473588, -0.68653986), (0.915964349, 1.777922752))
            ThreePointArc((0.915964349, 1.777922752), (-1.862958624, -0.727588595), (1.878473588, -0.68653986))
        make_face()
    extrude(amount=-CORTE_EXTRUS_O7_DEPTH, mode=Mode.SUBTRACT)

    # Filete3
    filete3_edges = [part.edges().sort_by_distance(p)[0] for p in [
        (0, 0, -15),
        (1.53137085, 15, 0.8),
        (2.4, 15, 0),
        (0.8, 15, -1.53137085),
        (0, 15, -2.4),
        (-1.53137085, 15, -0.8),
        (-2.4, 15, 0),
        (0, 15, -15),
        (-0.8, 15, 1.53137085),
        (0, 15, 2.4),
        (0.8, 15, 1.53137085),
        (-1.53137085, 15, 0.8),
        (-0.8, 15, -1.53137085),
        (1.53137085, 15, -0.8),
        (0, 0, -4.5),
        (0, -9, -4.5),
    ]]
    fillet(filete3_edges, radius=FILETE3_R)


solid = part.part
